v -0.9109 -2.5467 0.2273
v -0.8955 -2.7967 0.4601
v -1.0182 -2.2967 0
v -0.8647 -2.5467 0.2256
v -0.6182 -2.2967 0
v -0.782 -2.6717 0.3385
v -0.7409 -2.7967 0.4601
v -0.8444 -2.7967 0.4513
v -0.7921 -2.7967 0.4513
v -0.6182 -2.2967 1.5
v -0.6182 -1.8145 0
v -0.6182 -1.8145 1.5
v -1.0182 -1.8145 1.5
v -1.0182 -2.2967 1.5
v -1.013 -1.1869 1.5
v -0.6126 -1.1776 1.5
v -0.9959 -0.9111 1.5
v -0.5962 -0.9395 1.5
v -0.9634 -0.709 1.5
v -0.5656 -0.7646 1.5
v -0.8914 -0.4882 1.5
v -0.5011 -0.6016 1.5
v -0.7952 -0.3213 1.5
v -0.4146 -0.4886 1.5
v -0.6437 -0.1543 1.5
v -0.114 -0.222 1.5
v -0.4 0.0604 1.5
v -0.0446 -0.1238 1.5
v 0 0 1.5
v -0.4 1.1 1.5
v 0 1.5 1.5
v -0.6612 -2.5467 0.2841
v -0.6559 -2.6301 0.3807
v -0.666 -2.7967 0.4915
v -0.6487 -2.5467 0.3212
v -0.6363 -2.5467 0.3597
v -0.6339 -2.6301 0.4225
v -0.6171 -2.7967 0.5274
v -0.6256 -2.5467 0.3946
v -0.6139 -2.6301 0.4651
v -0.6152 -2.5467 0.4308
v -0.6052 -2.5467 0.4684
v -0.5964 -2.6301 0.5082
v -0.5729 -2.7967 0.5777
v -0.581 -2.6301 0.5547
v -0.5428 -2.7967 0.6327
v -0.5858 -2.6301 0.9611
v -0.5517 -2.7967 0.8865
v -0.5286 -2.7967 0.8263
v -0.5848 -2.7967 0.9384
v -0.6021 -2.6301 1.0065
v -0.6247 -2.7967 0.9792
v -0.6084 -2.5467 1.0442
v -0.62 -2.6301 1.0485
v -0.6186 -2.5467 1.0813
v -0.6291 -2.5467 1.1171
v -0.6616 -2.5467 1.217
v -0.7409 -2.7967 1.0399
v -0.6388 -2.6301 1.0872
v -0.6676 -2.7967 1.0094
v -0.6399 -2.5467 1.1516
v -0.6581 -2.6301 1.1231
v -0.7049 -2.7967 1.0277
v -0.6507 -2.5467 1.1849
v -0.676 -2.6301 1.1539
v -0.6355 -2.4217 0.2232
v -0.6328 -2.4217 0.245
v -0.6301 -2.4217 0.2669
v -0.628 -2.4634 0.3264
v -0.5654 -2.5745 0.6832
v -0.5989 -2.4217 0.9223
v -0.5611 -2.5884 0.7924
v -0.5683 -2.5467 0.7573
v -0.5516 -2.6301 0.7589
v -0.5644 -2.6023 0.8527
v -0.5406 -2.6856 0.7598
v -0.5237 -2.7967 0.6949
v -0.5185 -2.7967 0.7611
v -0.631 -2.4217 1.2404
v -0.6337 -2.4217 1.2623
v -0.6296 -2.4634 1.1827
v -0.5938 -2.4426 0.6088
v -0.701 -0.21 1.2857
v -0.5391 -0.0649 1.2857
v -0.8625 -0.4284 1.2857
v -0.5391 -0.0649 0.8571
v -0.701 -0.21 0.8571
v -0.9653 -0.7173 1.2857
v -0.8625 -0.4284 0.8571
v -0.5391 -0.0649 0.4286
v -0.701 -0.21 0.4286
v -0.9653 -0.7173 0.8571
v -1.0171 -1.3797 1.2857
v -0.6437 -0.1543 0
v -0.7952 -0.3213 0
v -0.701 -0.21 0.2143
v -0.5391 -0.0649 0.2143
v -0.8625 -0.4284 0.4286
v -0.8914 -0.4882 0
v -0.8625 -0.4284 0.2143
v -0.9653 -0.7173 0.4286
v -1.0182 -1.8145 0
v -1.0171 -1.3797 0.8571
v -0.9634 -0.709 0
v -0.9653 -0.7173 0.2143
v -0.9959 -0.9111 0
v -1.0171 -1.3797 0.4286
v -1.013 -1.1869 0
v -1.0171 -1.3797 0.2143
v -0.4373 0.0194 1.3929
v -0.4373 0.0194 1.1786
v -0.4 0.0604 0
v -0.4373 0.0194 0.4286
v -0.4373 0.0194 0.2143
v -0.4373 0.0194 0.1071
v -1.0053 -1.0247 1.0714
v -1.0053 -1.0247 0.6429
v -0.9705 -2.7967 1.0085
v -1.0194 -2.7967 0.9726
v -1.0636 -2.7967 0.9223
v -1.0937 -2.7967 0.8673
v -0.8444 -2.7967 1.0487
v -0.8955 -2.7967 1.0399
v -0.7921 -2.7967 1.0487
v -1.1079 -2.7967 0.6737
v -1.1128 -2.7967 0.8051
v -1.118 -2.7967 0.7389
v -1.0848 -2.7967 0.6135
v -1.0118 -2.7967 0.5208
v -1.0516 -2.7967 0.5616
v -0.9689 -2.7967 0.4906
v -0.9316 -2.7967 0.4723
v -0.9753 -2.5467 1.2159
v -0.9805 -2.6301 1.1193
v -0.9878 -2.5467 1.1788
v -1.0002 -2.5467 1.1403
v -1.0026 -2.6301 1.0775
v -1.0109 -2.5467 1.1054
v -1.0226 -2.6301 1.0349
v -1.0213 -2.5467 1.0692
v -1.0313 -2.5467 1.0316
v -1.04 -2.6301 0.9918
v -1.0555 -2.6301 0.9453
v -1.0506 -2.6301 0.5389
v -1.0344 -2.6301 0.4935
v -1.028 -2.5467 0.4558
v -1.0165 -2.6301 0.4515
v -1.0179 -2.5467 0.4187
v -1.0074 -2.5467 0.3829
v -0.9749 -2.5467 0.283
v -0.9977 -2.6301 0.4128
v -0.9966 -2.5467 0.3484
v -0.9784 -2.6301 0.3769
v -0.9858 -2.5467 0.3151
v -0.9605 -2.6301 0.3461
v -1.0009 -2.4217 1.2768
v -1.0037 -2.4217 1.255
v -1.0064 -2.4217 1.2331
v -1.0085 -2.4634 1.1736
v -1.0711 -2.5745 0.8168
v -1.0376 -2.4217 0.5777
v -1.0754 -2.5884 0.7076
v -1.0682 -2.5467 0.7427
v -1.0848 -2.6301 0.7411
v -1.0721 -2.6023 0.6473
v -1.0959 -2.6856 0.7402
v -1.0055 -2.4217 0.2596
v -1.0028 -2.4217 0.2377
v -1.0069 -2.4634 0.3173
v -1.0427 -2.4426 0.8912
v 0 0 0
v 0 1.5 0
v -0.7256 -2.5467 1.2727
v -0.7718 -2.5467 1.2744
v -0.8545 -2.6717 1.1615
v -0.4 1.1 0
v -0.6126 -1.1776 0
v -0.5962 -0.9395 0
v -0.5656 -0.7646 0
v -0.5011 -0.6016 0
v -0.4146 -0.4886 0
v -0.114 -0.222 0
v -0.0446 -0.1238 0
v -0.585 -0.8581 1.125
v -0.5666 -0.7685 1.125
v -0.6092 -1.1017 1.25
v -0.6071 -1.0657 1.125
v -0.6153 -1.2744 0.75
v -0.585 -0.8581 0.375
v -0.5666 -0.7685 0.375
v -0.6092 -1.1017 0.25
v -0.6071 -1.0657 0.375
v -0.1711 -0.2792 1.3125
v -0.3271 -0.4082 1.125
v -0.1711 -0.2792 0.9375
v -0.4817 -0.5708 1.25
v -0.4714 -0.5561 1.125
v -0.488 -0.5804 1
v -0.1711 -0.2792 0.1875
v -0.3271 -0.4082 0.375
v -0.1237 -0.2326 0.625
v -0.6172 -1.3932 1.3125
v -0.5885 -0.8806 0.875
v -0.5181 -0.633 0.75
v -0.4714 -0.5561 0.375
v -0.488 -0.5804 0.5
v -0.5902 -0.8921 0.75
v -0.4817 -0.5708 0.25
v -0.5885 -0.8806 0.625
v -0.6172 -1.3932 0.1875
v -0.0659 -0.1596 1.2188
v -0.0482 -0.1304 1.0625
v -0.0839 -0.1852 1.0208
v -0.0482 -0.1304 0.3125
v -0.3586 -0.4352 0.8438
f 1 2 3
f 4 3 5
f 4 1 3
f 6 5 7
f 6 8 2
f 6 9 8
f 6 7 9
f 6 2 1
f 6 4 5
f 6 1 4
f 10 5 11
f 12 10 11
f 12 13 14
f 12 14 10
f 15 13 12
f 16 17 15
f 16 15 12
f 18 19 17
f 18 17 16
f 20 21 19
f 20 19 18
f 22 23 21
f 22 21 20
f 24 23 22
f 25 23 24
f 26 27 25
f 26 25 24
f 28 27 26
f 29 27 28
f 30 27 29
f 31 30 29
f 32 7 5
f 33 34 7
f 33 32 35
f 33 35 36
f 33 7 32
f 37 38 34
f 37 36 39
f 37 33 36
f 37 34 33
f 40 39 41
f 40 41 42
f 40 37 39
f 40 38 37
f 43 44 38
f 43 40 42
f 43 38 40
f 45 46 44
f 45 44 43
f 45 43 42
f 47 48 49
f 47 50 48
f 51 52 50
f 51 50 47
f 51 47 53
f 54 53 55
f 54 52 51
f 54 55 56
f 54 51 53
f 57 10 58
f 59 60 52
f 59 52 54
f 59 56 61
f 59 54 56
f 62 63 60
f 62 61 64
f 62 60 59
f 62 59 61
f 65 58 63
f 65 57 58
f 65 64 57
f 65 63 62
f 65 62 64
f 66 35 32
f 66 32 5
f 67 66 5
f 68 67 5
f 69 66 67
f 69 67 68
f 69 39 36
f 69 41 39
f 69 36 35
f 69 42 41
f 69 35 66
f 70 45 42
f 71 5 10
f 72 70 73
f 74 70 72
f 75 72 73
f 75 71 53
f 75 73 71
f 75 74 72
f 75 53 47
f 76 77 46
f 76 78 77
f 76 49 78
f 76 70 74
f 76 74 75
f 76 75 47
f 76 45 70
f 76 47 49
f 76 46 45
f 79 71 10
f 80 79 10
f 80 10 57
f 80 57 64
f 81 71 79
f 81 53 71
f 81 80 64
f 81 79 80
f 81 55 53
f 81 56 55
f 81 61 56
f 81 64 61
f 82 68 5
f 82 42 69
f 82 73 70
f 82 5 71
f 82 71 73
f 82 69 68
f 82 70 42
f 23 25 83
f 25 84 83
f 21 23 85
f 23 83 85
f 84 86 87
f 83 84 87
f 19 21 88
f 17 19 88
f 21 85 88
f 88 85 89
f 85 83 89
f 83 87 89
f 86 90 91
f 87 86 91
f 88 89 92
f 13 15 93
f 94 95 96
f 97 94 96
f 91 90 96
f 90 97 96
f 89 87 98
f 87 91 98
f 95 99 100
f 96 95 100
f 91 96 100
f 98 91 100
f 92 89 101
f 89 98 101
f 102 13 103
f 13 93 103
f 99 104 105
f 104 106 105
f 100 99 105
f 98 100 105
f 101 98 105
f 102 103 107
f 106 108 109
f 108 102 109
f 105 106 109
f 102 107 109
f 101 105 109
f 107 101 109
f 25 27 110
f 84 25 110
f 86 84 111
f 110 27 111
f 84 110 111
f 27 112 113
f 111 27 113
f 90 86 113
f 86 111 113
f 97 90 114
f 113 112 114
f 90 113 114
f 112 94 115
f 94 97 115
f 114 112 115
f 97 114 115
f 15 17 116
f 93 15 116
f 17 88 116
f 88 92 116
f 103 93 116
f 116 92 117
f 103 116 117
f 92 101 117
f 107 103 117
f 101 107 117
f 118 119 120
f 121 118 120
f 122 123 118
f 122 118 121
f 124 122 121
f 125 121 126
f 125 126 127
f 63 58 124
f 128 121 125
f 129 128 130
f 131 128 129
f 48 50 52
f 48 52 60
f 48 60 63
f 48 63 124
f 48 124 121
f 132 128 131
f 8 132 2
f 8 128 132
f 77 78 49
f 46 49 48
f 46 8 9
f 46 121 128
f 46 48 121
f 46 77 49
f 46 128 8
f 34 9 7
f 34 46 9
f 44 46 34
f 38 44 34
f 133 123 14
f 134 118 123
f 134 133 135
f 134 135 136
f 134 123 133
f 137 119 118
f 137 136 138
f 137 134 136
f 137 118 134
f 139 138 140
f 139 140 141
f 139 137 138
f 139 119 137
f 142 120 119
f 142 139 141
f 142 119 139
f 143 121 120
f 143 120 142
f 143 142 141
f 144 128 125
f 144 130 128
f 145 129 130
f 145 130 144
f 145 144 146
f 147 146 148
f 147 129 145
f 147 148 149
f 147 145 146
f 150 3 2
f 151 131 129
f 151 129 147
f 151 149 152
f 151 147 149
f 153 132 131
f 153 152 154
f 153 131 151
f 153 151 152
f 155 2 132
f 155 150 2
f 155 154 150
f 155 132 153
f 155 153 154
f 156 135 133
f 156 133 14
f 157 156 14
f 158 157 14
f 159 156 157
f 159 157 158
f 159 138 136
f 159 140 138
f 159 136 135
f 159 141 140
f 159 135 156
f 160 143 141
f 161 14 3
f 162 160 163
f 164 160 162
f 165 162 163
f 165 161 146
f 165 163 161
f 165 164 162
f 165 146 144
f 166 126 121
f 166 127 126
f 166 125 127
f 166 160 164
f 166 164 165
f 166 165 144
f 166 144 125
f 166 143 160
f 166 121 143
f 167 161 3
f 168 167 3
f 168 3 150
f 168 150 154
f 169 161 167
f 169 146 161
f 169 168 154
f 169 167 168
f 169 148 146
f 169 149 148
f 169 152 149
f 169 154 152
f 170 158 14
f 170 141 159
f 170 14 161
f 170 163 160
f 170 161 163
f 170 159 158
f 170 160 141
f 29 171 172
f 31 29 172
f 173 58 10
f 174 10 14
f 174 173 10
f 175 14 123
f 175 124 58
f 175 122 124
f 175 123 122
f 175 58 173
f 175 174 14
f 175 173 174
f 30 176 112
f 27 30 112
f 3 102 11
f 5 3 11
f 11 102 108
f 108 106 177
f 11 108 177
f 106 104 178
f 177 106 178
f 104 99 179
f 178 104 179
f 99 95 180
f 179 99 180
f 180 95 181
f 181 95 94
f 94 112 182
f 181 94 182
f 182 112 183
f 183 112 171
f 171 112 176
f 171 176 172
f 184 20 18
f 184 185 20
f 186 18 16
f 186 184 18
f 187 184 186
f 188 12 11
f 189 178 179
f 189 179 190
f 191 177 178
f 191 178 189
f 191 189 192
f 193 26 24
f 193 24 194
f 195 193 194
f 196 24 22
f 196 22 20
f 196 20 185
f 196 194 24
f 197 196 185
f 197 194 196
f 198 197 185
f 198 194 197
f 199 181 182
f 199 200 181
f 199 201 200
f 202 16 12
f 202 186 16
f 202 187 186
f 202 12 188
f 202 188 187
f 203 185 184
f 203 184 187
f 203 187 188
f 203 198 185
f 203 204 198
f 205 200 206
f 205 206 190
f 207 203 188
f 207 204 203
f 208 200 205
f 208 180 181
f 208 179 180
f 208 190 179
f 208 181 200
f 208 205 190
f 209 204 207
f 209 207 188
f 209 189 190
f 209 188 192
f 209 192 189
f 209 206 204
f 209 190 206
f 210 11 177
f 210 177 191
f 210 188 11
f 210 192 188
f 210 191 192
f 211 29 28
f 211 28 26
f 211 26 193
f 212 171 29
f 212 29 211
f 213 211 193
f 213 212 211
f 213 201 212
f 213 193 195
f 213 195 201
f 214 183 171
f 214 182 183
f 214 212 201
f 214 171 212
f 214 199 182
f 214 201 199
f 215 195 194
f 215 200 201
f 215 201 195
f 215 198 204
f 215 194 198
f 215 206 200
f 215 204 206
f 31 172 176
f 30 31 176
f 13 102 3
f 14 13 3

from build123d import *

# Parameters (mm, degrees)
BOSS_EXTRUDE1_DEPTH = 1.5


with BuildPart() as part:
    # Sketch1 → Boss-Extrude1 (new body)
    with BuildSketch(Plane.XY):
        with BuildLine():
            Line((0, 0), (0, 1.5))
            Line((0, 1.5), (-0.4, 1.1))
            Line((-0.4, 1.1), (-0.4, 0.060352875))
            add(Edge.make_bspline(
                [(-0.4, 0.060352875), (-0.409973476, 0.044817545), (-0.423249666, 0.029918985), (-0.562369374, -0.083774644), (-0.839777589, -0.311942138), (-0.977221281, -0.718214966), (-1.008847213, -1.017715193), (-1.018913005, -1.358874566), (-1.018244352, -1.669580342), (-1.018244352, -1.814525752)],
                knots=[0.109484602, 0.109484602, 0.109484602, 0.109484602, 0.220799026, 0.332113451, 0.554742301, 0.666056726, 0.77737115, 0.888685575, 1, 1, 1, 1], degree=3))
            Line((-1.018244352, -1.814525752), (-1.018244352, -2.296742603))
            Line((-1.018244352, -2.296742603), (-0.618244352, -2.296742603))
            Line((-0.618244352, -2.296742603), (-0.618244352, -1.814525752))
            add(Edge.make_bspline(
                [(0, 0), (-0.065932077, -0.313499234), (-0.626607024, -0.397465224), (-0.618244352, -1.183817849), (-0.618244352, -1.814525752)],
                knots=[0, 0, 0, 0, 0.565457771, 1, 1, 1, 1], degree=3))
        make_face()
    extrude(amount=BOSS_EXTRUDE1_DEPTH)

    # Loft1: read off the stored shape, not the designer's step
    # Loft1: loft between two sections, ruled curve by curve
    loft1_from = [
        Edge.make_bspline([(-0.618244352, -2.296742603, 0), (-0.618244352, -2.296742603, 0.125), (-0.618244352, -2.296742603, 0.25), (-0.618244352, -2.296742603, 0.5), (-0.618244352, -2.296742603, 0.625), (-0.618244352, -2.296742603, 0.875), (-0.618244352, -2.296742603, 1), (-0.618244352, -2.296742603, 1.25), (-0.618244352, -2.296742603, 1.375), (-0.618244352, -2.296742603, 1.5)], [0, 0, 0, 0, 0.25, 0.25, 0.5, 0.5, 0.75, 0.75, 1, 1, 1, 1], 3),
        Edge.make_bspline([(-0.618244352, -2.296742603, 1.5), (-0.684911019, -2.296742603, 1.5), (-0.751577685, -2.296742603, 1.5), (-0.884911019, -2.296742603, 1.5), (-0.951577685, -2.296742603, 1.5), (-1.018244352, -2.296742603, 1.5)], [0, 0, 0, 0, 0.5, 0.5, 1, 1, 1, 1], 3),
        Edge.make_bspline([(-1.018244352, -2.296742603, 0), (-0.951577685, -2.296742603, 0), (-0.884911019, -2.296742603, 0), (-0.751577685, -2.296742603, 0), (-0.684911019, -2.296742603, 0), (-0.618244352, -2.296742603, 0)], [0, 0, 0, 0, 0.5, 0.5, 1, 1, 1, 1], 3),
        Edge.make_bspline([(-1.018244352, -2.296742603, 1.5), (-1.018244352, -2.296742603, 1.375), (-1.018244352, -2.296742603, 1.25), (-1.018244352, -2.296742603, 1), (-1.018244352, -2.296742603, 0.875), (-1.018244352, -2.296742603, 0.625), (-1.018244352, -2.296742603, 0.5), (-1.018244352, -2.296742603, 0.25), (-1.018244352, -2.296742603, 0.125), (-1.018244352, -2.296742603, 0)], [0, 0, 0, 0, 0.25, 0.25, 0.5, 0.5, 0.75, 0.75, 1, 1, 1, 1], 3),
    ]
    loft1_to = [
        Edge.make_bspline([(-0.740945557, -2.796742603, 0.460129518), (-0.694265059, -2.796742603, 0.472577651), (-0.640218461, -2.796742603, 0.499422848), (-0.550575921, -2.796742603, 0.598885017), (-0.518244352, -2.796742603, 0.673172169), (-0.518244352, -2.796742603, 0.826827831), (-0.550575921, -2.796742603, 0.901114983), (-0.640218461, -2.796742603, 1.000577152), (-0.694265059, -2.796742603, 1.027422349), (-0.740945557, -2.796742603, 1.039870482)], [0, 0, 0, 0, 0.25, 0.25, 0.5, 0.5, 0.75, 0.75, 1, 1, 1, 1], 3),
        Edge.make_bspline([(-0.740945557, -2.796742603, 1.039870482), (-0.765841822, -2.796742603, 1.046509486), (-0.792043087, -2.796742603, 1.049828988), (-0.844445617, -2.796742603, 1.049828988), (-0.870646882, -2.796742603, 1.046509486), (-0.895543147, -2.796742603, 1.039870482)], [0, 0, 0, 0, 0.5, 0.5, 1, 1, 1, 1], 3),
        Edge.make_bspline([(-0.895543147, -2.796742603, 0.460129518), (-0.870646882, -2.796742603, 0.453490514), (-0.844445617, -2.796742603, 0.450171012), (-0.792043087, -2.796742603, 0.450171012), (-0.765841822, -2.796742603, 0.453490514), (-0.740945557, -2.796742603, 0.460129518)], [0, 0, 0, 0, 0.5, 0.5, 1, 1, 1, 1], 3),
        Edge.make_bspline([(-0.895543147, -2.796742603, 1.039870482), (-0.942223645, -2.796742603, 1.027422349), (-0.996270243, -2.796742603, 1.000577152), (-1.085912783, -2.796742603, 0.901114983), (-1.118244352, -2.796742603, 0.826827831), (-1.118244352, -2.796742603, 0.673172169), (-1.085912783, -2.796742603, 0.598885017), (-0.996270243, -2.796742603, 0.499422848), (-0.942223645, -2.796742603, 0.472577651), (-0.895543147, -2.796742603, 0.460129518)], [0, 0, 0, 0, 0.25, 0.25, 0.5, 0.5, 0.75, 0.75, 1, 1, 1, 1], 3),
    ]
    loft1 = Solid(Shell([*[Face.make_surface_from_curves(loft1_from[k], loft1_to[k]) for k in range(4)], Face(Wire(loft1_from)), Face(Wire(loft1_to))]))
    add(loft1)


solid = part.part
